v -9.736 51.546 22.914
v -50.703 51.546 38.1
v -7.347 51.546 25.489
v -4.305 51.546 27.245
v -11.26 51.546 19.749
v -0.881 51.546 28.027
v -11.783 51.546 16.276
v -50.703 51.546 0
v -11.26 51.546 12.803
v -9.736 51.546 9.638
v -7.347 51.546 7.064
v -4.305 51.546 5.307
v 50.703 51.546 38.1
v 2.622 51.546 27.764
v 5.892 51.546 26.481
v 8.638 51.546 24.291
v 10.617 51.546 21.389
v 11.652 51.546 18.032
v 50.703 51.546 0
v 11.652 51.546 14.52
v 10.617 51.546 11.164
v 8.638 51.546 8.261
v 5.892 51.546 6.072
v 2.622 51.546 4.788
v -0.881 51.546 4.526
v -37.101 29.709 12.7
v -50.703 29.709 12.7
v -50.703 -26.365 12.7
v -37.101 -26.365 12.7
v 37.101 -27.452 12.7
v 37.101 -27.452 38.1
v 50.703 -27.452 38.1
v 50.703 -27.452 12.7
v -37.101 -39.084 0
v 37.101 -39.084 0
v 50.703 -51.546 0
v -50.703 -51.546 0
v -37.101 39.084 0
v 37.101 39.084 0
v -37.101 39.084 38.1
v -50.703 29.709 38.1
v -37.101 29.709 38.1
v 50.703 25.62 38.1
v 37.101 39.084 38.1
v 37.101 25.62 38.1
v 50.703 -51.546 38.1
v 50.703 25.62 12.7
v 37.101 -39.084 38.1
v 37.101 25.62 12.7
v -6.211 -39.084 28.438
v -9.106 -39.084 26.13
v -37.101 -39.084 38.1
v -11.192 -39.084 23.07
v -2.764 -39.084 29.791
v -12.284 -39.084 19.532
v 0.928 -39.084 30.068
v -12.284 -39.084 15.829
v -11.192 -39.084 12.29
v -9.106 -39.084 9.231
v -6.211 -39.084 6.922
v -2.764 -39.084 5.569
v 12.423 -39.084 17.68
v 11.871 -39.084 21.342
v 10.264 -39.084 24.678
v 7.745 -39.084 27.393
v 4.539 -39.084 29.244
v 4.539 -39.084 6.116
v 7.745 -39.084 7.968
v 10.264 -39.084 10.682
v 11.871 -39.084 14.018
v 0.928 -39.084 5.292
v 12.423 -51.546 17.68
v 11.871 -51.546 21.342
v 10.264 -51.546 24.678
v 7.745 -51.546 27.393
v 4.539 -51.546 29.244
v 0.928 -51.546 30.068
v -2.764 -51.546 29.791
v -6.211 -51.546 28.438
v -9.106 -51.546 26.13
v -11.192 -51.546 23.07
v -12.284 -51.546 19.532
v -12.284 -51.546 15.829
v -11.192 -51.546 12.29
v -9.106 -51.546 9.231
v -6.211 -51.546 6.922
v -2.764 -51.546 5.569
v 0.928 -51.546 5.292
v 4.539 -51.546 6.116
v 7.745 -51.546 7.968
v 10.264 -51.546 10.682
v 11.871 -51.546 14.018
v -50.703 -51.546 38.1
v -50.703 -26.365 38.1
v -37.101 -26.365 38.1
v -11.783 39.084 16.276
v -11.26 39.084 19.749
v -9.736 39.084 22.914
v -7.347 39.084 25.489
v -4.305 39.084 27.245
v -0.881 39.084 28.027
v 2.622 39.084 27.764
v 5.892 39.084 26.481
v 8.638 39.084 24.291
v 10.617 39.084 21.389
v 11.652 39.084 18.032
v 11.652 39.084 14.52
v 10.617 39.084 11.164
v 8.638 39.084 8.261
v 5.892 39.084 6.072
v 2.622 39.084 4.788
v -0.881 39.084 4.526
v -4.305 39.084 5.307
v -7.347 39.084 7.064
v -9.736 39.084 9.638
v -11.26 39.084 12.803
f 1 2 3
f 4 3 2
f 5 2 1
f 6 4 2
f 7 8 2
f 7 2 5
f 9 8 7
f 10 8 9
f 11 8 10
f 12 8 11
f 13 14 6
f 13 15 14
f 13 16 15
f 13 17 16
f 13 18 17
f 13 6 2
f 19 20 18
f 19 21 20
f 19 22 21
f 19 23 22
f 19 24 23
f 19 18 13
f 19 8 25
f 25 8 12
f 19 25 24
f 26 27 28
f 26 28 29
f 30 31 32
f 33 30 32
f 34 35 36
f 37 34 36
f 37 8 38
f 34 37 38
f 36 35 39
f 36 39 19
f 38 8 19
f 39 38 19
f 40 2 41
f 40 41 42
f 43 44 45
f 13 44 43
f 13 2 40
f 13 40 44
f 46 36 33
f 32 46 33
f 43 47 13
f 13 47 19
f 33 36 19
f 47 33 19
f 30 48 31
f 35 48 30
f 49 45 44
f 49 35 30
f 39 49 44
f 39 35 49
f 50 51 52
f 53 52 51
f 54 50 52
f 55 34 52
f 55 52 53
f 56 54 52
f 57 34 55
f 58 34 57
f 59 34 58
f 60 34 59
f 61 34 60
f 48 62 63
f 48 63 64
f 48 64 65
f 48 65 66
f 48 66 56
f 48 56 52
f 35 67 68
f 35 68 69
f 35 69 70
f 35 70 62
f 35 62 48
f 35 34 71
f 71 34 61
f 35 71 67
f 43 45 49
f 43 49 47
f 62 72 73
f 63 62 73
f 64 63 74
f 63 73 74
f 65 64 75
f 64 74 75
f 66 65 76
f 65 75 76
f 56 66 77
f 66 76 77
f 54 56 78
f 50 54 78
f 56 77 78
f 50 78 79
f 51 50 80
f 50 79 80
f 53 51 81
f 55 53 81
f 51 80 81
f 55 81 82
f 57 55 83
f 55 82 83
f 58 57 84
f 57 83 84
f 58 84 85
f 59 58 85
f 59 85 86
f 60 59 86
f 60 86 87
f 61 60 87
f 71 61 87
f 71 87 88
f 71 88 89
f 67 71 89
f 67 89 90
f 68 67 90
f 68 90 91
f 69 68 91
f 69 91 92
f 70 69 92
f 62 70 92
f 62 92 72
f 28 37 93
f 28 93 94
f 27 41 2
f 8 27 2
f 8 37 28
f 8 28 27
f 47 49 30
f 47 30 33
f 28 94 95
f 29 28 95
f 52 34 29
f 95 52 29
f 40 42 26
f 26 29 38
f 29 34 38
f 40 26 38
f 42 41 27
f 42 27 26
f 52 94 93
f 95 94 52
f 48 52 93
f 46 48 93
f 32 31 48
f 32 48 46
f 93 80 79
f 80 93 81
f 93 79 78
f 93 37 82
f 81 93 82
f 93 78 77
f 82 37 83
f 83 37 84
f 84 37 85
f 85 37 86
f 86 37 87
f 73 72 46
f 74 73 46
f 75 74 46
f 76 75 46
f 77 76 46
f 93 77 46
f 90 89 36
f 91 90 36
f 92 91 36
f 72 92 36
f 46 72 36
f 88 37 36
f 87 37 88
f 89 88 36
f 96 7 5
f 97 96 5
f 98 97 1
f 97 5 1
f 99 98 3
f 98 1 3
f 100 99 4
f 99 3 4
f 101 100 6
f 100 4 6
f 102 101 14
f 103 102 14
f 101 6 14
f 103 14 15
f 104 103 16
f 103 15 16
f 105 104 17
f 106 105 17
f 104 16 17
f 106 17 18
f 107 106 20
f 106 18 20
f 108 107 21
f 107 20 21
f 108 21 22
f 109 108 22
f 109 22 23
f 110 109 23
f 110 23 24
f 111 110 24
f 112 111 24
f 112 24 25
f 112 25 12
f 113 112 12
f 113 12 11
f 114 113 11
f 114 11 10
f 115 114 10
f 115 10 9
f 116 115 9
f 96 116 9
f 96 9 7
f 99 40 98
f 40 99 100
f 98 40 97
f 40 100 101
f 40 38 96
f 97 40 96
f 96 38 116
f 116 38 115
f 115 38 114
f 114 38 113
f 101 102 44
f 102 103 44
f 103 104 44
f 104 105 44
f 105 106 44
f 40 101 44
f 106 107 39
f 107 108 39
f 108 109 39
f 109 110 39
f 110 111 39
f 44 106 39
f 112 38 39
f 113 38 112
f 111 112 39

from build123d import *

# Parameters (mm, degrees)
F0_W     = 101.406738162
F0_H     = 103.0912548304
F0_W_2   = 74.2010474205
F0_H_2   = 78.1673192978
F1_DEPTH = 38.1
F2_W     = 13.6028453708
F2_H     = 56.0740102082
F3_DEPTH = 25.4
F2_H_2   = 53.0724562705
F4_DEPTH = 25.4
F5_R     = 12.4226697252
F6_DEPTH = 25.4
F7_R     = 11.7834333481
F8_DEPTH = 25.4


with BuildPart() as f1:
    # F0 (on Top) → F1 (new body)
    with BuildSketch(Plane.XY):
        Rectangle(F0_W, F0_H)
        Rectangle(F0_W_2, F0_H_2, mode=Mode.SUBTRACT)
    extrude(amount=F1_DEPTH)

    # F2 (on face) → F3 (cut)
    with BuildSketch(Plane.XY.offset(38.1)):
        with Locations((-43.9019463956, 1.6720136628)):
            Rectangle(F2_W, F2_H)
    extrude(amount=-F3_DEPTH, mode=Mode.SUBTRACT)

    # F2 (on face) → F4 (cut)
    with BuildSketch(Plane.XY.offset(38.1)):
        with Locations((43.9019463956, -0.9162034839)):
            Rectangle(F2_W, F2_H_2)
    extrude(amount=-F4_DEPTH, mode=Mode.SUBTRACT)

    # F5 (on face) → F6 (cut)
    with BuildSketch(Plane.XZ.offset(51.5456274152)):
        with Locations((0, 17.6801010966)):
            Circle(F5_R)
    extrude(amount=-F6_DEPTH, mode=Mode.SUBTRACT)

    # F7 (on face) → F8 (cut)
    with BuildSketch(Plane(origin=(0, 51.5456274152, 0), x_dir=(-1, 0, 0), z_dir=(0, 1, 0))):
        with Locations((0, 16.2762645632)):
            Circle(F7_R)
    extrude(amount=-F8_DEPTH, mode=Mode.SUBTRACT)


solid = f1.part
